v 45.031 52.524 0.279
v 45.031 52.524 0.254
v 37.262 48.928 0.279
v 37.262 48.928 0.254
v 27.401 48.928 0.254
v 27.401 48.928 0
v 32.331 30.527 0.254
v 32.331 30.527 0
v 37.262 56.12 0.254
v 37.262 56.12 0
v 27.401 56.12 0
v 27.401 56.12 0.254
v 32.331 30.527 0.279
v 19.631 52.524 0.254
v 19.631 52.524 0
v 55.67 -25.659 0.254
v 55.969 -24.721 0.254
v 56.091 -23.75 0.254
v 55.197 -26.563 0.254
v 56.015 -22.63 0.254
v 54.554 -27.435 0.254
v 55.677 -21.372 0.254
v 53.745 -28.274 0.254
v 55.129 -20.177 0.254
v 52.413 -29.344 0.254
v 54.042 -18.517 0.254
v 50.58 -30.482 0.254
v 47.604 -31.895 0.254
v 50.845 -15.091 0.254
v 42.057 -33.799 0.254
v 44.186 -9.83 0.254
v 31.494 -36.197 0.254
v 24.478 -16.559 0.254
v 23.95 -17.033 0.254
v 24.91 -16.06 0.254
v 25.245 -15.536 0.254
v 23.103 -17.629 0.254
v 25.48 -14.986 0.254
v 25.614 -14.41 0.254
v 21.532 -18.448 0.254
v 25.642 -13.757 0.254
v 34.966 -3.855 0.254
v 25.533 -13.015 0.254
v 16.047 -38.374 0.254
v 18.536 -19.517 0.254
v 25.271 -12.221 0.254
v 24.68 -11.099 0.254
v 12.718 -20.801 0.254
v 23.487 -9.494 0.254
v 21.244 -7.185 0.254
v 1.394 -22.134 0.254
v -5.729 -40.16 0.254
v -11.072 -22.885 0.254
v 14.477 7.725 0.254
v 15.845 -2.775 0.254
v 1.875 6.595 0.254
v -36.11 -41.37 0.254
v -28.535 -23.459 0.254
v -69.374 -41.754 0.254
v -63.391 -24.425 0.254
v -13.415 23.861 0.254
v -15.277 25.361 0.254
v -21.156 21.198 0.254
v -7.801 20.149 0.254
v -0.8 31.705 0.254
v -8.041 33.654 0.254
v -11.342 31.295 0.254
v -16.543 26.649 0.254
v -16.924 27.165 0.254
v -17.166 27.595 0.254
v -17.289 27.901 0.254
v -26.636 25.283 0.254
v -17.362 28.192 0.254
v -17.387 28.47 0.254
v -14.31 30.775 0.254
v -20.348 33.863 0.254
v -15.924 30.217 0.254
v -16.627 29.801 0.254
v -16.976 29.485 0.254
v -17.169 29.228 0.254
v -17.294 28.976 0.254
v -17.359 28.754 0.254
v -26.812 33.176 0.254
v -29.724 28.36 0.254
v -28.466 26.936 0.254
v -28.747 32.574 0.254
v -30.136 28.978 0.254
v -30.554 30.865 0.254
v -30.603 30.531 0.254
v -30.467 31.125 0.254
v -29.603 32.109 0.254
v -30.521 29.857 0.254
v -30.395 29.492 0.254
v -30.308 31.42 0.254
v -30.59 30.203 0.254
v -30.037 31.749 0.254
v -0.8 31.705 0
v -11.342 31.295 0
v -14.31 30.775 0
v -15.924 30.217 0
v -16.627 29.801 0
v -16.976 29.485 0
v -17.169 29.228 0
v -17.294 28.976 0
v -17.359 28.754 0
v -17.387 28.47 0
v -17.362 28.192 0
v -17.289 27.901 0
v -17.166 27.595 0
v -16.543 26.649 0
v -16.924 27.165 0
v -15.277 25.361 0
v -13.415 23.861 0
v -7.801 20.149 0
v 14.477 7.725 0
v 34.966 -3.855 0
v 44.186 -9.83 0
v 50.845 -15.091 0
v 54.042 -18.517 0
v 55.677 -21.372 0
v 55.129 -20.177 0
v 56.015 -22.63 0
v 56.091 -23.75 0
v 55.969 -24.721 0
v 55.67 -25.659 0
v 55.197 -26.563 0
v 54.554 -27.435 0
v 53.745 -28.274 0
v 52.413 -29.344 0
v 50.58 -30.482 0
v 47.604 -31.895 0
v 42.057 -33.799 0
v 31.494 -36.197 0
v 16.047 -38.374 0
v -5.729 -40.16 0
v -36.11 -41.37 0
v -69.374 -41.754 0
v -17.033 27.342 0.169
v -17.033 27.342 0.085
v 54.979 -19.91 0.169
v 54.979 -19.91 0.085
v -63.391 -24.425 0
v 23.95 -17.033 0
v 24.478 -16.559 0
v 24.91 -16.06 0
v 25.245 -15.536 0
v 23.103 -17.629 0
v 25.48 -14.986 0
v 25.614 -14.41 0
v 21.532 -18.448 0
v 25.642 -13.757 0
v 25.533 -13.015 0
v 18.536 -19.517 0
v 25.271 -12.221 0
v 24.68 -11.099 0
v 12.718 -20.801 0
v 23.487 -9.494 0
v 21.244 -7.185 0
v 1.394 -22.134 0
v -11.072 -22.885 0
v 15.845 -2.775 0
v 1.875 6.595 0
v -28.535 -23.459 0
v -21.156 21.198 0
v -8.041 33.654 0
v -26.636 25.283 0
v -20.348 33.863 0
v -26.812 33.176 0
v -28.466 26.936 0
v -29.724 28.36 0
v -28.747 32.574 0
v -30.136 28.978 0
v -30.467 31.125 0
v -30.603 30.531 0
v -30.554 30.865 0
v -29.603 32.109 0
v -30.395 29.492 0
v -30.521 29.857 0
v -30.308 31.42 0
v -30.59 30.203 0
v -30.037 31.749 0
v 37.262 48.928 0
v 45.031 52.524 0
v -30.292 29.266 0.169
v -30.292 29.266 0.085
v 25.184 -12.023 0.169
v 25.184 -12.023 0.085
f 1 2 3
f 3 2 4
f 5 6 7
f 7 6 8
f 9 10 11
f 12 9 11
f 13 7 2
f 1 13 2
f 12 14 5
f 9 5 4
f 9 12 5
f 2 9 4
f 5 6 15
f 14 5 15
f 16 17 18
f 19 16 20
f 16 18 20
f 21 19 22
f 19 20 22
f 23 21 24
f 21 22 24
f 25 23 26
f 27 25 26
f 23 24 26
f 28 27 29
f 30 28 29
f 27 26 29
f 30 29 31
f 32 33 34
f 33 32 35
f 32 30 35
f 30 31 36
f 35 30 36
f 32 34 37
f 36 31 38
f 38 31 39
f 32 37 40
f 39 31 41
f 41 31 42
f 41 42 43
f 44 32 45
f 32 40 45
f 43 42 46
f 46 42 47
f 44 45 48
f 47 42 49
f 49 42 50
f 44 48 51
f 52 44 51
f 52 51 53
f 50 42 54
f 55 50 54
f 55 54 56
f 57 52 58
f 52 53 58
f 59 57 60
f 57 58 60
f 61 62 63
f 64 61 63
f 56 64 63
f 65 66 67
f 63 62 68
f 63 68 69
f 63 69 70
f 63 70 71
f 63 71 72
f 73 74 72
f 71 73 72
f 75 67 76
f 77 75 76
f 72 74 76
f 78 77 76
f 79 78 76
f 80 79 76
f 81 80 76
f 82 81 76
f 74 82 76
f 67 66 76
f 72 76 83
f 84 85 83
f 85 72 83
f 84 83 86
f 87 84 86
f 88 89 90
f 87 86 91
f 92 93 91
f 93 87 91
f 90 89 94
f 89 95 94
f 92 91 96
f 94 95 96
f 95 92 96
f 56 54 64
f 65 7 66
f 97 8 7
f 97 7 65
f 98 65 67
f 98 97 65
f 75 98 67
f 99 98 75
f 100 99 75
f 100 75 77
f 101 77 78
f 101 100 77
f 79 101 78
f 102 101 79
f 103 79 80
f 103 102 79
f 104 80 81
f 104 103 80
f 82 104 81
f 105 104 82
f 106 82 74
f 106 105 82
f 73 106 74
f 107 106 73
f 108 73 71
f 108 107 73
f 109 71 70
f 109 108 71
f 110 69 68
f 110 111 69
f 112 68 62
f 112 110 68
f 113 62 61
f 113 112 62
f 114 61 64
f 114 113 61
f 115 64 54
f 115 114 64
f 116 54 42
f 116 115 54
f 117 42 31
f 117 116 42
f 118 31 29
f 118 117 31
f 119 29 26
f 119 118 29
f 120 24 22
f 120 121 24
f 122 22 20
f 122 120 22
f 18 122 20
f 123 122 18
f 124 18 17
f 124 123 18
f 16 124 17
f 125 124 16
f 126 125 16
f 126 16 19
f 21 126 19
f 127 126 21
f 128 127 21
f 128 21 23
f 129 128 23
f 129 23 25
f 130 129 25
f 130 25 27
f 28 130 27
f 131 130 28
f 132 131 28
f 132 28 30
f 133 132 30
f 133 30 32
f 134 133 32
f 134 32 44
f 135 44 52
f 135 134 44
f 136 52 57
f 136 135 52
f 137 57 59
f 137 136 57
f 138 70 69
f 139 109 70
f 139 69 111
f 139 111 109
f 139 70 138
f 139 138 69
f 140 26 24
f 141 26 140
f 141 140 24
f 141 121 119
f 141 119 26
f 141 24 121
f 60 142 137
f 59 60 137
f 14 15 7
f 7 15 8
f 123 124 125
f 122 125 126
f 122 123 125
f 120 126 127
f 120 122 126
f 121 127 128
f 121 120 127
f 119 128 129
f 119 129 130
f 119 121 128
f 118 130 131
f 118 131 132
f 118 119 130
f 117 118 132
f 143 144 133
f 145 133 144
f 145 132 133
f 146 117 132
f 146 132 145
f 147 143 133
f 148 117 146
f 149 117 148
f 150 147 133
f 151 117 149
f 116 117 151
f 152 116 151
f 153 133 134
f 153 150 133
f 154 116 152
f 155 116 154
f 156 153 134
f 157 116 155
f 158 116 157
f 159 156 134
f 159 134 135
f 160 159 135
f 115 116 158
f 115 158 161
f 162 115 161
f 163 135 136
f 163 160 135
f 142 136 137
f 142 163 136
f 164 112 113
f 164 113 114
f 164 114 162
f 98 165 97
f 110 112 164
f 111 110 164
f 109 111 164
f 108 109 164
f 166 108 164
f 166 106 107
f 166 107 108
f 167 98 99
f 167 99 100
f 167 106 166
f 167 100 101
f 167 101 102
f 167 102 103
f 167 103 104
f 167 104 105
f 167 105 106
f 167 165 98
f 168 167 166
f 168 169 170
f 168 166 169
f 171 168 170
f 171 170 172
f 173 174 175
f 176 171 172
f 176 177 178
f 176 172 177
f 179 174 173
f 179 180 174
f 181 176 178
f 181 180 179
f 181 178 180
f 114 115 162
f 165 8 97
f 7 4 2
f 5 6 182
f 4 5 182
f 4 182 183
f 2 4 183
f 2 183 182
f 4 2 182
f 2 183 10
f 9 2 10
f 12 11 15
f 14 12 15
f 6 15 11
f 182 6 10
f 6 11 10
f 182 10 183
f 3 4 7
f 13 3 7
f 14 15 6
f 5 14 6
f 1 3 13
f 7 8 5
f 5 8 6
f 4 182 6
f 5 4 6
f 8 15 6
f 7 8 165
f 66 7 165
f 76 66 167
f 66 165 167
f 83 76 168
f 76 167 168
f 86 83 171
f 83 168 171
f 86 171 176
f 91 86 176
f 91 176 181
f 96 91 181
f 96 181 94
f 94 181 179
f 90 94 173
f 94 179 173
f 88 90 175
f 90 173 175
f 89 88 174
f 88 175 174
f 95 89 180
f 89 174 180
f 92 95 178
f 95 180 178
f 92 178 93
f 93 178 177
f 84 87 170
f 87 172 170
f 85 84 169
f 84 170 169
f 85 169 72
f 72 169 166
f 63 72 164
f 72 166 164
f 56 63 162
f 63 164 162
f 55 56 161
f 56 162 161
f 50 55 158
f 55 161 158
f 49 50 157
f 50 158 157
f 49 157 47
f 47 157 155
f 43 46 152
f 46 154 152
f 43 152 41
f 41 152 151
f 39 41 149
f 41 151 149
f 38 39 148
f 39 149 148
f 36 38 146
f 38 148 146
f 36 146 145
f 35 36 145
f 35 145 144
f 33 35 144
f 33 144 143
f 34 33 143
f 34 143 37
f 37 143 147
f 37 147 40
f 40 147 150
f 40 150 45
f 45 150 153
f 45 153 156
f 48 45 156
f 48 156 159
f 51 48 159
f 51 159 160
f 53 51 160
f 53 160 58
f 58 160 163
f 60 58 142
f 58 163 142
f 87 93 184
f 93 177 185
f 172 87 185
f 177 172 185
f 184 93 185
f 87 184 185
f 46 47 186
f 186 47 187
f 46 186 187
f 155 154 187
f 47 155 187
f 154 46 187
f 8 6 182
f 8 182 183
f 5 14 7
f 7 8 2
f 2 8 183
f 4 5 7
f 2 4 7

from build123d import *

# Parameters (mm, degrees)
F1_DEPTH = 0.254
F3_DEPTH = 0.254
F5_DEPTH = 0.254
F7_DEPTH = 0.254
F9_DEPTH = 0.0254


with BuildPart() as f1:
    # F0 (on Top) → F1 (new body)
    with BuildSketch(Plane.XY):
        with BuildLine():
            add(Edge.make_bspline(
                [(32.3311924146, 30.5267168231), (6.1832049311, 31.4184533549), (-56.404909456, 37.0038669279), (117.2922357219, -34.3584042871), (2.3639605893, -41.6481557064), (-69.374486804, -41.7538322508)],
                knots=[0, 0, 0, 0, 0.255287258, 0.5921491381, 1, 1, 1, 1], degree=3))
            add(Edge.make_bspline(
                [(32.3311924146, 30.5267168231), (0, 33.0365635455), (-70.2253727994, 41.7341166509), (72.8621746041, -26.0537960355), (-16.8823206713, -22.6216614541), (-63.391021555, -24.4254103514)],
                knots=[0, 0, 0, 0, 0.3080999575, 0.6318350835, 1, 1, 1, 1], degree=3))
            Line((-63.391021555, -24.4254103514), (-69.374486804, -41.7538322508))
        make_face()
    extrude(amount=F1_DEPTH)


with BuildPart() as f3:
    # F2 (on Top) → F3 (new body)
    with BuildSketch(Plane.XY):
        Polygon((27.4006896054, 48.9276038139), (32.3311924146, 30.5267168231), (45.0311924146, 52.5237620792), (37.2616952239, 48.9276038139), align=None)
    extrude(amount=F3_DEPTH)


with BuildPart() as f5:
    # F4 (on Top) → F5 (new body)
    with BuildSketch(Plane.XY):
        Polygon((27.4006896054, 48.9276038139), (19.6311924146, 52.5237620792), (32.3311924146, 30.5267168231), align=None)
    extrude(amount=F5_DEPTH)


with BuildPart() as f7:
    # F6 (on Top) → F7 (new body)
    with BuildSketch(Plane.XY):
        Polygon((27.4006896054, 56.1199203445), (19.6311924146, 52.5237620792), (27.4006896054, 48.9276038139), (37.2616952239, 48.9276038139), (45.0311924146, 52.5237620792), (37.2616952239, 56.1199203445), align=None)
    extrude(amount=F7_DEPTH)


with BuildPart() as f9:
    # F8 (on face) → F9 (new body)
    with BuildSketch(Plane.XY.offset(0.254)):
        Polygon((45.0311924146, 52.5237620792), (37.2616952239, 48.9276038139), (32.3311924146, 30.5267168231), align=None)
    extrude(amount=F9_DEPTH)


solid = Compound([f1.part, f3.part, f5.part, f7.part, f9.part])
